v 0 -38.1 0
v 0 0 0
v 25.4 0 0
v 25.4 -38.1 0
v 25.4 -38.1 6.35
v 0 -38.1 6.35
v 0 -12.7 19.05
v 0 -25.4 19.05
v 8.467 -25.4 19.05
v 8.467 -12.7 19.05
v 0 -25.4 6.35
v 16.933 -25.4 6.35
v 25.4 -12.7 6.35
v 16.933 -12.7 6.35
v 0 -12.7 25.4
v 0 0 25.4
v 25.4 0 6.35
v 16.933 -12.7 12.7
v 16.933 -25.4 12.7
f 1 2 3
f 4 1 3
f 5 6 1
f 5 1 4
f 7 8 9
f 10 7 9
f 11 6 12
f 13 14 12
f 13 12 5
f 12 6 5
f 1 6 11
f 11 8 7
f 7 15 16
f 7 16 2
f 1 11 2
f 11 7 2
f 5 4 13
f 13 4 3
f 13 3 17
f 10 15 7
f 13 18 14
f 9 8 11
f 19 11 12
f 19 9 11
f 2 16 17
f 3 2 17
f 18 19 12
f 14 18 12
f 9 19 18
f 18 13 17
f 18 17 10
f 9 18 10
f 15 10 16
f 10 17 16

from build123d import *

# Parameters (mm, degrees)
F0_W     = 25.4
F0_H     = 6.35
F1_DEPTH = 38.1
F3_DEPTH = 12.7
F5_DEPTH = 12.7


with BuildPart() as f1:
    # F0 (on Front) → F1 (new body)
    with BuildSketch(Plane.XZ):
        Polygon((0, 25.4), (0, 6.35), (25.4, 6.35), align=None)
        with Locations((12.7, 3.175)):
            Rectangle(F0_W, F0_H)
    extrude(amount=F1_DEPTH)

    # F2 (on face) → F3 (cut)
    with BuildSketch(Plane.XZ.offset(38.1)):
        Polygon((0, 25.4), (0, 6.35), (25.4, 6.35), align=None)
    extrude(amount=-F3_DEPTH, mode=Mode.SUBTRACT)

    # F4 (on face) → F5 (cut)
    with BuildSketch(Plane.XZ.offset(25.4)):
        Polygon((8.466667, 19.05), (0, 25.4), (0, 19.05), align=None)
        Polygon((25.4, 6.35), (16.933333, 12.7), (16.933333, 6.35), align=None)
    extrude(amount=-F5_DEPTH, mode=Mode.SUBTRACT)


solid = f1.part
